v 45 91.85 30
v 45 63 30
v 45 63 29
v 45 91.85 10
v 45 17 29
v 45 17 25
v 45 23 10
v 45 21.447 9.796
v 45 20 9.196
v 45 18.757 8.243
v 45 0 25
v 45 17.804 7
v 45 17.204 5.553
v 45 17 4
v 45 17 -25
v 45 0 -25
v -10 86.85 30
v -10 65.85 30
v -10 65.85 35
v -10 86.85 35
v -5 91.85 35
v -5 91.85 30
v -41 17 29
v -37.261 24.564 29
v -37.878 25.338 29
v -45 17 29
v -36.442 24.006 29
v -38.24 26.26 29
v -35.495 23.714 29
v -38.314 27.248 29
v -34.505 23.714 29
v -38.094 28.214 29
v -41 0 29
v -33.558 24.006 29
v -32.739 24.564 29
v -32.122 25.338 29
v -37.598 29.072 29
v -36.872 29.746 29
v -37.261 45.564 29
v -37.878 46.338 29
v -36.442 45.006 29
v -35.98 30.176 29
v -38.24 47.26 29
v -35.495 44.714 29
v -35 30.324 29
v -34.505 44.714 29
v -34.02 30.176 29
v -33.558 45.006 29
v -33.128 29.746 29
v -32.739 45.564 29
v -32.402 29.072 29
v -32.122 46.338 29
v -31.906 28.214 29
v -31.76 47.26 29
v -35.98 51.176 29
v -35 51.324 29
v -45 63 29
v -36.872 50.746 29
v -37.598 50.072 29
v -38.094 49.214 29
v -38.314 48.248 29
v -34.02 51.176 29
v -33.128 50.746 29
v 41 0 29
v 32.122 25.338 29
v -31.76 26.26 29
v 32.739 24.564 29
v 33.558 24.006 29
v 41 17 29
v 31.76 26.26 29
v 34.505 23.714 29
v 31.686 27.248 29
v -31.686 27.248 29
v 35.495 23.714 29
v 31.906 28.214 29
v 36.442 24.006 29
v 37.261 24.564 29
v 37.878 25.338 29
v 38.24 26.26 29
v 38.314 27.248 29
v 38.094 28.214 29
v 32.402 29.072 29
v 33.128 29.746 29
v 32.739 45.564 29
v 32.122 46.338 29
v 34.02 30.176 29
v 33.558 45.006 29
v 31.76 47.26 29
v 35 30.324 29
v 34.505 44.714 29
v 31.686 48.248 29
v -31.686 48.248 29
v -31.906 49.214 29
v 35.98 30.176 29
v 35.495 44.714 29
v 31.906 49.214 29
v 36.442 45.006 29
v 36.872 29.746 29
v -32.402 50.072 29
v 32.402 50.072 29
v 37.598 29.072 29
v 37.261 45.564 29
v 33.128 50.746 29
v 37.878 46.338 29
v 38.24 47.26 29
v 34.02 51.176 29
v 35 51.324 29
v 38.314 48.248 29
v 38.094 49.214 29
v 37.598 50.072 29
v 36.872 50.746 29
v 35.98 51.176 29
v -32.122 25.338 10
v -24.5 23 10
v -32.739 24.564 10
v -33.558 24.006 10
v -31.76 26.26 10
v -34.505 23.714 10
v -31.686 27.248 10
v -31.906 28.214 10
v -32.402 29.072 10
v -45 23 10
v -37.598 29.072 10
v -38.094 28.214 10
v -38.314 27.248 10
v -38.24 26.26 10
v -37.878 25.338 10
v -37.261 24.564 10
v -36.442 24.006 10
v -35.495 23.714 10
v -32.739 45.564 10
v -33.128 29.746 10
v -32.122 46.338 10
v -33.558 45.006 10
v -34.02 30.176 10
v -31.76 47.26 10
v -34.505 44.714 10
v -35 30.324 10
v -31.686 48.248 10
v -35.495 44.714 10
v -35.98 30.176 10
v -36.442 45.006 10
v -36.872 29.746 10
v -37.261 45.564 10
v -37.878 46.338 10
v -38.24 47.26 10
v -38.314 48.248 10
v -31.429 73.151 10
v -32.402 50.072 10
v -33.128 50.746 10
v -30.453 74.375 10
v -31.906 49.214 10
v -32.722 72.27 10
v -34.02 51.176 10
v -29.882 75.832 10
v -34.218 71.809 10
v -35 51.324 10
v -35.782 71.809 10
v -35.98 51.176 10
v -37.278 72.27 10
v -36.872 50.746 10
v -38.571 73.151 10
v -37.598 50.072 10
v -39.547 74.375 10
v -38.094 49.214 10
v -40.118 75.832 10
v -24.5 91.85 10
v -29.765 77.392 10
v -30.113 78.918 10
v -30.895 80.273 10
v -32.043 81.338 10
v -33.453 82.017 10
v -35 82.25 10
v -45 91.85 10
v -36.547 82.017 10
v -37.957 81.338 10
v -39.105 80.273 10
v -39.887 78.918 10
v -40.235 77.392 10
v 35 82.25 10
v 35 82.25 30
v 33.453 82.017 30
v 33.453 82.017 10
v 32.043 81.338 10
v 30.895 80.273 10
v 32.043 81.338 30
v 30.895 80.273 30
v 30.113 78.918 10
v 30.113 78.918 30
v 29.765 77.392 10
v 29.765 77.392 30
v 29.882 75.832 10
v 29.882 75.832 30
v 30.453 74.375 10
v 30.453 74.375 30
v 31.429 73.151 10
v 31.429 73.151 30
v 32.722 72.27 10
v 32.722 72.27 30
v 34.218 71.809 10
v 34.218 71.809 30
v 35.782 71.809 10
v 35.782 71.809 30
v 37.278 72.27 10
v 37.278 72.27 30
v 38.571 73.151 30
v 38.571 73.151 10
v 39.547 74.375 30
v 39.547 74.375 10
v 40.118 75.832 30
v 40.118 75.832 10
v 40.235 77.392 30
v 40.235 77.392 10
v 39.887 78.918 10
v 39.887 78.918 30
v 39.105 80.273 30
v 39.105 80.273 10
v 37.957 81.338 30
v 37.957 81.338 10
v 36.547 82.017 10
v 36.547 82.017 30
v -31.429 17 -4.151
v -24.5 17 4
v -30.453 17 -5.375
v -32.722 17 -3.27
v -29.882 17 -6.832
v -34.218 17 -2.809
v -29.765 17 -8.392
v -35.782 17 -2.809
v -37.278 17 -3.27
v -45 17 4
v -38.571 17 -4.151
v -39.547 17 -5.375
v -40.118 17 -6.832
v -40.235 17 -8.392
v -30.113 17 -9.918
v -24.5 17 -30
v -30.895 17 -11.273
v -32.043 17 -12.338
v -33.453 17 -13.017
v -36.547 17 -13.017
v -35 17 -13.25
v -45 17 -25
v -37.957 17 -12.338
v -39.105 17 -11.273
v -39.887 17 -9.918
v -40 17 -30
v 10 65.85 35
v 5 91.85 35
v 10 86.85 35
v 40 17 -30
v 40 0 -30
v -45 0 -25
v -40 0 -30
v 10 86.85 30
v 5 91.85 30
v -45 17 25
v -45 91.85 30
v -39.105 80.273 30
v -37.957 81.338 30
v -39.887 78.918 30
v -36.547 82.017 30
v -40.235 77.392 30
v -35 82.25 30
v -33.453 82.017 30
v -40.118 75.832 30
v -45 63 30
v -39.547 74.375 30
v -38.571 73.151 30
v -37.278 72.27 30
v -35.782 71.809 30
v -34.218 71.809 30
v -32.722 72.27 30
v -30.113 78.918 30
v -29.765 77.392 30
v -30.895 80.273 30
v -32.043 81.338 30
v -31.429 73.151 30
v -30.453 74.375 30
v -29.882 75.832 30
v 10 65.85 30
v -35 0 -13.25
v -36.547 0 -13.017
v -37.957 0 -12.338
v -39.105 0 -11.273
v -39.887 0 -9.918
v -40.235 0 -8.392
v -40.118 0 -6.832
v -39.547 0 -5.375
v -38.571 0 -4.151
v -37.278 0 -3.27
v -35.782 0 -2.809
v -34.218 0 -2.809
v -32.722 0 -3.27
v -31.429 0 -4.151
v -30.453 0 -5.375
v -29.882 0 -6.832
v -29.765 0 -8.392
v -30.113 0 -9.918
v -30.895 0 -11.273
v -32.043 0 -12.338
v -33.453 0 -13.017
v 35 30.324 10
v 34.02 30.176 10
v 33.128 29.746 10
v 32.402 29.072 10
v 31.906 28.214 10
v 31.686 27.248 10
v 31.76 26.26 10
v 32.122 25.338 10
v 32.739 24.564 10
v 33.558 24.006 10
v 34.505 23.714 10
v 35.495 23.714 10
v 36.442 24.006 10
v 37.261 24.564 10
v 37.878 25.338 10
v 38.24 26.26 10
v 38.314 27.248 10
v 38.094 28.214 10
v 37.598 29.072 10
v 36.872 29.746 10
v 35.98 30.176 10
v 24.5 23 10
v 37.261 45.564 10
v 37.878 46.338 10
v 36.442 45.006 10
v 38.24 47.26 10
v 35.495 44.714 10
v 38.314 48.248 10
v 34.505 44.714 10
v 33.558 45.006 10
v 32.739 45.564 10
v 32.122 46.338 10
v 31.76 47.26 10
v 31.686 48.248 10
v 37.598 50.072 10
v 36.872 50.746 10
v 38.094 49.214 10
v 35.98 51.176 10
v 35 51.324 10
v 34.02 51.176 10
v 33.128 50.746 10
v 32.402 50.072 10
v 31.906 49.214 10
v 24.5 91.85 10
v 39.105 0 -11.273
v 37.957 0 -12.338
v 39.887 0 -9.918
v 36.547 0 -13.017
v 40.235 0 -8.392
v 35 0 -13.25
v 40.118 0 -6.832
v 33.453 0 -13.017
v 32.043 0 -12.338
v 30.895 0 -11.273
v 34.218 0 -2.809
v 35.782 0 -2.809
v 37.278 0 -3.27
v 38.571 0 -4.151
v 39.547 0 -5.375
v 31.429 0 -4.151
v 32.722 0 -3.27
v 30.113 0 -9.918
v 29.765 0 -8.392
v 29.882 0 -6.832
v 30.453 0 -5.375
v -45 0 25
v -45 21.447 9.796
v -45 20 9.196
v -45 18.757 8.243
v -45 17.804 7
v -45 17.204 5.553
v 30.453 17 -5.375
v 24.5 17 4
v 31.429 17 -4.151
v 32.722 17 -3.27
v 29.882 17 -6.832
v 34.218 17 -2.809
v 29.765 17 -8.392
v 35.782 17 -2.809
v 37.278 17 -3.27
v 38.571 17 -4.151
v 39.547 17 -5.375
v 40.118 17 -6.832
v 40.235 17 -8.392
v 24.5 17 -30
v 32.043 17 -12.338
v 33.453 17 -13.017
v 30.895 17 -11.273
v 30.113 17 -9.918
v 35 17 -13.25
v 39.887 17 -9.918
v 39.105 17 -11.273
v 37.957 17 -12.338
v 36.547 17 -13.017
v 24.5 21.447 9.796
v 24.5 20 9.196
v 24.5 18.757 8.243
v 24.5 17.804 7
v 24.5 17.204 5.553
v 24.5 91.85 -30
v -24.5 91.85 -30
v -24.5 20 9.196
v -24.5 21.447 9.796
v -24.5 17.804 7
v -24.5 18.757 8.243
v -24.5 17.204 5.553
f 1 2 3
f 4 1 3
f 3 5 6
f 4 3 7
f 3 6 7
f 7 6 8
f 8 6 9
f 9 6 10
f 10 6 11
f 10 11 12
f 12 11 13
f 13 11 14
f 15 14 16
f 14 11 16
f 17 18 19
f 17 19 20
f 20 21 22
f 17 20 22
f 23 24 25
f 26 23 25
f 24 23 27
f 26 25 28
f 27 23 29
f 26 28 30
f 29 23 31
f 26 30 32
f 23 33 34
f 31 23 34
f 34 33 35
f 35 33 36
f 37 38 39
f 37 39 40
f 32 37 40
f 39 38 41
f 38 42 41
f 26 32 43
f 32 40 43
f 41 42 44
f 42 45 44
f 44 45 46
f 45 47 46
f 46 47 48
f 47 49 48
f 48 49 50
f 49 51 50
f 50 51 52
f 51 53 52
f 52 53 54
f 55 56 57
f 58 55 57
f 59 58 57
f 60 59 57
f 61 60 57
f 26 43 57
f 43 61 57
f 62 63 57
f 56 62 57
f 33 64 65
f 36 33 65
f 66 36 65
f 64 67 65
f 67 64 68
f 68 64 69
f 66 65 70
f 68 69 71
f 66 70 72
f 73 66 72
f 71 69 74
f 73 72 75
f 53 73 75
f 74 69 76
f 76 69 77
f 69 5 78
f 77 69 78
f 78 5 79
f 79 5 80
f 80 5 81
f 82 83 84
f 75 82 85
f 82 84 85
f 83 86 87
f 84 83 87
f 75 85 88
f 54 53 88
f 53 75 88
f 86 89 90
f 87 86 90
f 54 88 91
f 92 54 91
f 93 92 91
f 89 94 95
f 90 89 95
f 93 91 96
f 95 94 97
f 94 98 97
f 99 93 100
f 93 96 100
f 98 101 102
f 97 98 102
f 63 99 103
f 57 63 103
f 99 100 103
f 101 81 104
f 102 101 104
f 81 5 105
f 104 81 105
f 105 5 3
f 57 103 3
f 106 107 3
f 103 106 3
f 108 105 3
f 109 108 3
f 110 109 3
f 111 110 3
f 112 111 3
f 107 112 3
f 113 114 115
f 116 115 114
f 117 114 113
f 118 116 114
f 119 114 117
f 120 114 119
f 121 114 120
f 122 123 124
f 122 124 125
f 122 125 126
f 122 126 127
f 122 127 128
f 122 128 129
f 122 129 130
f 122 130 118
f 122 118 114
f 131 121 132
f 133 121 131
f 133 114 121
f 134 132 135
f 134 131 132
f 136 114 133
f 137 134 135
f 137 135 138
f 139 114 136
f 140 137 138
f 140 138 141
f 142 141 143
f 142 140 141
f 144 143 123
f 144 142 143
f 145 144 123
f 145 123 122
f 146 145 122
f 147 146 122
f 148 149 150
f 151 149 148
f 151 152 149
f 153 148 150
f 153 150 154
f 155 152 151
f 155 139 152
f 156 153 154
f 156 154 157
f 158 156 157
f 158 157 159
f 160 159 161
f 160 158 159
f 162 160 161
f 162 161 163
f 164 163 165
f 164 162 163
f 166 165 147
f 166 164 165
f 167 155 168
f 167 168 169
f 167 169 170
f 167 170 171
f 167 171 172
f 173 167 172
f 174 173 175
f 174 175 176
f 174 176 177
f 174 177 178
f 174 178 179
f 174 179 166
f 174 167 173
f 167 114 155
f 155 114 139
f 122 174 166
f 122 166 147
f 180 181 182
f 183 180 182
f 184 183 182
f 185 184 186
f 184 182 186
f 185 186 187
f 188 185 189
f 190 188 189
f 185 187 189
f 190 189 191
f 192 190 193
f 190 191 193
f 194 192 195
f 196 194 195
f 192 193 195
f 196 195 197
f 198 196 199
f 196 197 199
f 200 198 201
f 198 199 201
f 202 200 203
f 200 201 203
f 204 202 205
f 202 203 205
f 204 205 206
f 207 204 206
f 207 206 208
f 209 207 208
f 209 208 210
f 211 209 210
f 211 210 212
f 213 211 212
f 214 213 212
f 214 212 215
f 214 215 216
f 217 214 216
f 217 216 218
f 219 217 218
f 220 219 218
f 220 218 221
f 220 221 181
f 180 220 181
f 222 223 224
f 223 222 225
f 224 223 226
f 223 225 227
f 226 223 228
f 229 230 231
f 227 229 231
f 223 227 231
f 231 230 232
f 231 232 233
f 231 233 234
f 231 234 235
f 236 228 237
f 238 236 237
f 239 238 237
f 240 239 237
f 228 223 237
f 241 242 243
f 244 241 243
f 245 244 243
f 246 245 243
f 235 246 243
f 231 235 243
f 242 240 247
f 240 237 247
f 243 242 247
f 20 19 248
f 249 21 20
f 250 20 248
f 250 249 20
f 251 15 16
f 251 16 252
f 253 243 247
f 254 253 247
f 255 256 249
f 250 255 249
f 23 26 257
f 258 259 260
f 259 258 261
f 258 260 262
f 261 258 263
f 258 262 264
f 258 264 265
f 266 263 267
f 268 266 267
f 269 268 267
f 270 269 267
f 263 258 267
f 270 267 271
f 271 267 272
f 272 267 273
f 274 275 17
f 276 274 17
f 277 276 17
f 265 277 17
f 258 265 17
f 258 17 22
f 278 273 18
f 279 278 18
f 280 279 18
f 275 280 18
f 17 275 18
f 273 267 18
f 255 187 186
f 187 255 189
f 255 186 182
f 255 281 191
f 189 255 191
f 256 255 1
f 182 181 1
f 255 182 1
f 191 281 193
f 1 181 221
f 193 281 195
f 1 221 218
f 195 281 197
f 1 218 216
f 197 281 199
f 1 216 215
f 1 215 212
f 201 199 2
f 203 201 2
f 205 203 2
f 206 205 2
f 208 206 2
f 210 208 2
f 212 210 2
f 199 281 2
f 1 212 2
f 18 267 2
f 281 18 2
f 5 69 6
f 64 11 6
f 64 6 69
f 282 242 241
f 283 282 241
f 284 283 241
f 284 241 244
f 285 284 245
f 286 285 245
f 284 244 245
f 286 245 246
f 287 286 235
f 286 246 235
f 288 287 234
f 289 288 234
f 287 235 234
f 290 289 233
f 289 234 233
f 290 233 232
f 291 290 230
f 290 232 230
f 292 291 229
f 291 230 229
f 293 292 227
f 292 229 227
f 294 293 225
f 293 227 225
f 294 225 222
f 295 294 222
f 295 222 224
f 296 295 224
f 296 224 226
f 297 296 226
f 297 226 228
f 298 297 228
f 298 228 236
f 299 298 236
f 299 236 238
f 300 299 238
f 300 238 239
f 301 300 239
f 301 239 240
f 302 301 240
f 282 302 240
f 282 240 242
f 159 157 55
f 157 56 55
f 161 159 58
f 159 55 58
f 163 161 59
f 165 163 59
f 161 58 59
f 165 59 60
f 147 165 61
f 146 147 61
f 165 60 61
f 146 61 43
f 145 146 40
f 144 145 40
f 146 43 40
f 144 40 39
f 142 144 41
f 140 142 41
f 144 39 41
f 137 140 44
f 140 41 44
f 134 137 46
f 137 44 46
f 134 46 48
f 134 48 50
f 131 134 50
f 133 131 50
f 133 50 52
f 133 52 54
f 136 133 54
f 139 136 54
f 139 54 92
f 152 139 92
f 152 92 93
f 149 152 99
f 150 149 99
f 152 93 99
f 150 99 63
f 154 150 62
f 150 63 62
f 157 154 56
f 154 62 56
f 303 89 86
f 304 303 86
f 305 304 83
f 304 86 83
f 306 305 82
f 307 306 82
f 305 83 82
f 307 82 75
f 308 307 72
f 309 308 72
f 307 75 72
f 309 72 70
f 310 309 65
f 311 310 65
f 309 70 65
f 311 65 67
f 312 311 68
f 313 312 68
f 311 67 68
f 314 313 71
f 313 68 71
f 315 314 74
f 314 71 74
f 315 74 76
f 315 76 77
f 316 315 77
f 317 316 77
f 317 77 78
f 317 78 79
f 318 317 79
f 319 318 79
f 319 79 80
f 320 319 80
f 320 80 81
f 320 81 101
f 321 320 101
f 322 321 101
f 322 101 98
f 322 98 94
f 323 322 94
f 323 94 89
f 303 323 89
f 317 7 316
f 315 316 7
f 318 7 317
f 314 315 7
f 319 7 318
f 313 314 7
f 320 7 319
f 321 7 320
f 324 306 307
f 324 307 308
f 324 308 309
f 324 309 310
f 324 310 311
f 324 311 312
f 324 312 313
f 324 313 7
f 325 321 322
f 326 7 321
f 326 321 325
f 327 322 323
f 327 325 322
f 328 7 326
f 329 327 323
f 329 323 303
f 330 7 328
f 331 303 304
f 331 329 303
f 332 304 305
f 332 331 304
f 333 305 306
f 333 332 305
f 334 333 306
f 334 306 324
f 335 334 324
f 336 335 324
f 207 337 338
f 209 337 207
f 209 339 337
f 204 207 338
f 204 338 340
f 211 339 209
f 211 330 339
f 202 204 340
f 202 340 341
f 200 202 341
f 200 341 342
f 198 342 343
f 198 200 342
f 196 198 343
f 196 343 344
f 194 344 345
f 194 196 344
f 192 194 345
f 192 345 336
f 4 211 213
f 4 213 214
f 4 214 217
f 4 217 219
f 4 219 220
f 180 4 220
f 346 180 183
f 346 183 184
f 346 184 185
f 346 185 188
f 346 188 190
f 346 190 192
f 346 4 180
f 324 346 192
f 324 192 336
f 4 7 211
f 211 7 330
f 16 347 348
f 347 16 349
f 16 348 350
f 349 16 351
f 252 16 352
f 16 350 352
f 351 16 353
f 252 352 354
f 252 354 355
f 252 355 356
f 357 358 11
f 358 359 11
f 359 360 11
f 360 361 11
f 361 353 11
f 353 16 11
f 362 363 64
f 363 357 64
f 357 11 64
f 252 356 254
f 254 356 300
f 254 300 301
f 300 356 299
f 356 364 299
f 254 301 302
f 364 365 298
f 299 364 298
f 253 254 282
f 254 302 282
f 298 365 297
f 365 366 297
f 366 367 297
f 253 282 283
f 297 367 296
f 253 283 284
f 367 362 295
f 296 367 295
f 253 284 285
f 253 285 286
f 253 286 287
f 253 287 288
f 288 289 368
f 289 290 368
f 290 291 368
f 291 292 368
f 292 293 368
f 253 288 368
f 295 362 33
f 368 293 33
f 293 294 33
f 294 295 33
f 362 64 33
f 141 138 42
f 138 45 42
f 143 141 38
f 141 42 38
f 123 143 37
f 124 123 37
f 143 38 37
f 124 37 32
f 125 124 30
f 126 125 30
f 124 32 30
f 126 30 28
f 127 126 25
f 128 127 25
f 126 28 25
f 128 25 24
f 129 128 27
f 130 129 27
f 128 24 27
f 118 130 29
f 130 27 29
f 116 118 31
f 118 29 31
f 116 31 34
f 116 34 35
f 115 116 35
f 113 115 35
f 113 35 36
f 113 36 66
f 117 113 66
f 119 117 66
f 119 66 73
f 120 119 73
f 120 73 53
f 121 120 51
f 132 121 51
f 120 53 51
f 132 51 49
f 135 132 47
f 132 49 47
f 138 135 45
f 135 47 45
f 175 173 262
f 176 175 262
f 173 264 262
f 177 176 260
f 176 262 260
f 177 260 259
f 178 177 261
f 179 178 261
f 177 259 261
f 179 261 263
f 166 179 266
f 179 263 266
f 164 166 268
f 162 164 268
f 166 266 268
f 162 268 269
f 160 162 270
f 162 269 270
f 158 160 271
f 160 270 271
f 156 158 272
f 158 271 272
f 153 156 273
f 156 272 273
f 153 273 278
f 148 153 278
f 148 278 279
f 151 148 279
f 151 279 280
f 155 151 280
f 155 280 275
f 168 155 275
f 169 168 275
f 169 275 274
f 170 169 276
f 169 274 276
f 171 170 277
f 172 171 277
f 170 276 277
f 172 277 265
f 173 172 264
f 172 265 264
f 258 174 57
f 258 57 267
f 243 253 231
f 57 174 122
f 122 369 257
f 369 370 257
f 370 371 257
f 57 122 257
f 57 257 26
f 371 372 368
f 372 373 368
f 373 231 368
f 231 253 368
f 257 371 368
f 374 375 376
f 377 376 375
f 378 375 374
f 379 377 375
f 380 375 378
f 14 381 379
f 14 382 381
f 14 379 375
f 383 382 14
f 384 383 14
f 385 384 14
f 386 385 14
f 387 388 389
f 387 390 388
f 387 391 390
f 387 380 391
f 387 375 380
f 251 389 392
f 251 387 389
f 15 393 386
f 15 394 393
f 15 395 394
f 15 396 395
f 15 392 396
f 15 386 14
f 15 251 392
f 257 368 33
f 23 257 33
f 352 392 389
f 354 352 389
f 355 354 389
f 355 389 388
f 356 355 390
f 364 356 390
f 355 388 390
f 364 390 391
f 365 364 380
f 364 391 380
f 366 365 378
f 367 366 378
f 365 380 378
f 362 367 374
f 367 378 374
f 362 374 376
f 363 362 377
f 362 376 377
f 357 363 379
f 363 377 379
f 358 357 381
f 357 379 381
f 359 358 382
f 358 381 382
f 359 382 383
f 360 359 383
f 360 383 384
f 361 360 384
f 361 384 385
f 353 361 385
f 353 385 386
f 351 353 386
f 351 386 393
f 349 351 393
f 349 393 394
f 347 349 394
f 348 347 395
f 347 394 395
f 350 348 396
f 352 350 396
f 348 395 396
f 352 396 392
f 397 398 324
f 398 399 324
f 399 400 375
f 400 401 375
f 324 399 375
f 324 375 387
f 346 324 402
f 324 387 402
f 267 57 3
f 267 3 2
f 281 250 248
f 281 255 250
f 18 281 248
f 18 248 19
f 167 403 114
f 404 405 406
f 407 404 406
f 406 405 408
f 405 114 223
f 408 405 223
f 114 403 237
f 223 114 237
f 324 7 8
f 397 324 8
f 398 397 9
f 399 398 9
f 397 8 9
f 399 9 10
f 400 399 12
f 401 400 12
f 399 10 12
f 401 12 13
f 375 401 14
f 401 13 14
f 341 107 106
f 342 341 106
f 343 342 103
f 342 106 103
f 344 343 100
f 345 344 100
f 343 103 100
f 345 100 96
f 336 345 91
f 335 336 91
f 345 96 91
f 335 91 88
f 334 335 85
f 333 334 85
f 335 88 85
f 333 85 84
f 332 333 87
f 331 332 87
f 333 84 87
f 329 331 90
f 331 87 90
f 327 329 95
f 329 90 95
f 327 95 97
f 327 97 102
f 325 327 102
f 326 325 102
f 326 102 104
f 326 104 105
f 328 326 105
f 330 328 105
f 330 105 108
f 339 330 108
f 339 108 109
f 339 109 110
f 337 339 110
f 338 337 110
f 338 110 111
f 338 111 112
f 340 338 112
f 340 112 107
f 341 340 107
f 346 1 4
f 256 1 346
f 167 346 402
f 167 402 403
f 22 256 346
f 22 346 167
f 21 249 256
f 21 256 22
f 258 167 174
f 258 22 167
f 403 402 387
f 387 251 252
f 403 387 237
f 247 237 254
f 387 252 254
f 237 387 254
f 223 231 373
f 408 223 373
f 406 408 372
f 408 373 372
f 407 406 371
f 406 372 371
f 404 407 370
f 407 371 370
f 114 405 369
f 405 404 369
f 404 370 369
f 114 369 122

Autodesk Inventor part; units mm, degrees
ref_plane "YZ Plane" through (0, 0, 0) normal (1, 0, 0) x (0, 1, 0)
ref_plane "XZ Plane" through (0, 0, 0) normal (0, 1, 0) x (-1, 0, 0)
ref_plane "XY Plane" through (0, 0, 0) normal (0, 0, 1) x (1, 0, 0)
sketch "Sketch5" plane through (0, 0, 0) normal (0, 1, 0) x (-1, 0, 0)
  line L0 (45, 30) -> (-45, 30)
  line L1 (-45, 30) -> (-45, -30)
  line L2 (-45, -30) -> (45, -30)
  line L3 (45, -30) -> (45, 30)
  point P0 (0, 0)
  point P1 (0, 30)
  point P2 (45, 0)
  dimension "d8" = 90
  dimension "d9" = 60
extrude "Extrusion5" add sketch "Sketch5" along normal blind 91.85
sketch "Sketch6" plane through (-45, 0, 30) normal (0, 0, 1) x (1, 0, 0)
  line L0 (0, 0) -> (90, 0) projected
  line L1 (0, 91.85) -> (90, 91.85) projected
  line L2 (35, 91.85) -> (55, 91.85)
  line L3 (55, 91.85) -> (55, 65.85)
  line L4 (55, 65.85) -> (35, 65.85)
  line L5 (35, 65.85) -> (35, 91.85)
  point P0 (45, 0)
  point P1 (45, 65.85)
  point P2 (45, 0)
  dimension "d12" = 26
  dimension "d13" = 20
extrude "Extrusion6" add sketch "Sketch6" along normal blind 5
chamfer "Chamfer2" distance 5 angle 45 2 edges at (10, 91.85, 32.5) (-10, 91.85, 32.5)
sketch "Sketch8" plane through (45, 0, -30) normal (0, 0, -1) x (-1, 0, 0)
  line L0 (0, 0) -> (90, 0) projected
  line L1 (90, 0) -> (90, 91.85) projected
  line L2 (0, 91.85) -> (90, 91.85) projected
  line L3 (0, 0) -> (0, 91.85) projected
  line L4 (20.5, 17) -> (20.5, 91.85)
  line L5 (45, 0) -> (45, 11.253)
  line L6 (45, 91.85) -> (45, 84.4514)
  line L7 (69.5, 91.85) -> (69.5, 17)
  line L8 (77.5, 17) -> (90, 17)
  line L9 (77.5, 17) -> (69.5, 17)
  line L10 (20.5, 17) -> (0, 17)
  point P0 (20.5, 25)
  point P1 (12.5, 17)
  point P2 (69.5, 25)
  dimension "d42" = 90
extrude "Extrusion7" cut sketch "Sketch8" against normal blind 40 contours L3 L2 L4 L10 | L8 L9 L7 L2 L1
sketch "Sketch9" plane through (45, 0, 10) normal (0, 0, -1) x (-1, 0, 0)
  circle A0 centre (10, 77) radius 5
  circle A1 centre (80, 77) radius 5
  line L0 (0, 0) -> (90, 0) projected
  line L1 (0, 17) -> (0, 91.85) projected
  circle A2 centre (10, 77) radius 10
  line L2 (0, 91.85) -> (90, 91.85)
  line L3 (45, 91.85) -> (45, 95.8754) construction
  line L4 (20.5, 91.85) -> (20.5, 17) construction
  point P0 (45, 0)
  dimension "d47" = 10
  dimension "d56" = 70
  dimension "d58" = 77
  dimension "d61" = 20
  dimension "d62" = 35
  dimension "d63" = 20.5
hole "Hole2" at (-35, 77, 10) at (35, 77, 10) direction (0, 0, 1) diameter 10.5 end through all
fillet "Fillet3" radius 6 2 edges at (34.75, 17, 10) (-34.75, 17, 10)
sketch "Sketch11" plane through (0, 0, 0) normal (0, -1, 0) x (1, 0, 0)
  line L0 (45, -30) -> (-45, -30) projected
  circle A0 centre (-35, -8) radius 5.25
  circle A1 centre (35, -8) radius 5.25
  circle A2 centre (-35, -8) radius 10
  line L1 (-24.5, 4) -> (-45, 4) projected
  point P0 (0, 0)
  dimension "d64" = 70
  dimension "d65" = 10.5
  dimension "d66" = 20
  dimension "d67" = 22
  dimension "d75" = 35
  dimension "d76" = 34
hole "Hole3" at (-35, 0, -8) at (35, 0, -8) direction (0, 1, 0) diameter 10.5 end through all
sketch "Sketch12" plane through (45, 0, 30) normal (1, 0, 0) x (0, 0, -1)
  line L0 (0, 0) -> (0, 91.85) projected
  line L1 (0, 0) -> (60, 0) projected
  line L2 (0, 0) -> (1, 0)
  line L3 (1, 0) -> (1, 63)
  line L4 (1, 63) -> (0, 63)
  line L5 (0, 63) -> (0, 0)
  point P0 (30, 0)
  dimension "d77" = 1
  dimension "d78" = 63
  dimension "d79" = 0
extrude "Extrusion8" cut sketch "Sketch12" against normal through all
sketch "Sketch13" plane through (45, 0, 10) normal (0, 0, -1) x (-1, 0, 0)
  circle A0 centre (10, 77) radius 5.25 projected
  circle A1 centre (10, 48) radius 4
  circle A2 centre (10, 27) radius 4
  line L0 (0, 0) -> (90, 0) projected
  circle A3 centre (80, 77) radius 5.25 projected
  line L1 (45, 0) -> (45, -5.7212)
  circle A4 centre (80, 48) radius 4
  circle A5 centre (80, 27) radius 4
  dimension "d82" = 27
  dimension "d83" = 70
  dimension "d84" = 8
  dimension "d85" = 48
hole "Hole4" at (35, 48, 10) at (35, 27, 10) at (-35, 48, 10) at (-35, 27, 10) direction (0, 0, 1) diameter 6.647 end through all thread size "M8x1.25" class "6H" standard "ISO Metric profile"
sketch "Sketch16" plane through (0, 0, 0) normal (0, -1, 0) x (1, 0, 0)
  line L0 (-45, 29) -> (-41, 29)
  line L1 (-45, 25) -> (-45, 29)
  line L2 (-45, 25) -> (-41, 29)
  line L3 (0, 0) -> (0, -4.4881)
  line L4 (45, 29) -> (41, 29)
  line L5 (45, 25) -> (45, 29)
  line L6 (45, 25) -> (41, 29)
  line L7 (0, 0) -> (2.8094, 0)
  line L8 (-45, -30) -> (-40, -30)
  line L9 (-45, -25) -> (-45, -30)
  line L10 (-45, -25) -> (-40, -30)
  line L11 (45, -30) -> (40, -30)
  line L12 (45, -25) -> (45, -30)
  line L13 (45, -25) -> (40, -30)
  line L14 (45, -30) -> (-45, -30) projected
  line L15 (45, 29) -> (45, -30) projected
  dimension "d96" = 4
  dimension "d97" = 4
  dimension "d100" = 5
  dimension "d101" = 5
  dimension "d102" = 5
  dimension "d103" = 5
  dimension "d104" = 4
extrude "Extrusion10" cut sketch "Sketch16" against normal up to surface (17 mm away) from surface at 0
equation "\"d62\" = 0.5 * d56"
equation "\"d75\" = 0.5 * d64"
equation "\"d102\" = d101"
equation "\"d103\" = d100"
properties part number "BC-10019-B" material "Alumínio 7075"
